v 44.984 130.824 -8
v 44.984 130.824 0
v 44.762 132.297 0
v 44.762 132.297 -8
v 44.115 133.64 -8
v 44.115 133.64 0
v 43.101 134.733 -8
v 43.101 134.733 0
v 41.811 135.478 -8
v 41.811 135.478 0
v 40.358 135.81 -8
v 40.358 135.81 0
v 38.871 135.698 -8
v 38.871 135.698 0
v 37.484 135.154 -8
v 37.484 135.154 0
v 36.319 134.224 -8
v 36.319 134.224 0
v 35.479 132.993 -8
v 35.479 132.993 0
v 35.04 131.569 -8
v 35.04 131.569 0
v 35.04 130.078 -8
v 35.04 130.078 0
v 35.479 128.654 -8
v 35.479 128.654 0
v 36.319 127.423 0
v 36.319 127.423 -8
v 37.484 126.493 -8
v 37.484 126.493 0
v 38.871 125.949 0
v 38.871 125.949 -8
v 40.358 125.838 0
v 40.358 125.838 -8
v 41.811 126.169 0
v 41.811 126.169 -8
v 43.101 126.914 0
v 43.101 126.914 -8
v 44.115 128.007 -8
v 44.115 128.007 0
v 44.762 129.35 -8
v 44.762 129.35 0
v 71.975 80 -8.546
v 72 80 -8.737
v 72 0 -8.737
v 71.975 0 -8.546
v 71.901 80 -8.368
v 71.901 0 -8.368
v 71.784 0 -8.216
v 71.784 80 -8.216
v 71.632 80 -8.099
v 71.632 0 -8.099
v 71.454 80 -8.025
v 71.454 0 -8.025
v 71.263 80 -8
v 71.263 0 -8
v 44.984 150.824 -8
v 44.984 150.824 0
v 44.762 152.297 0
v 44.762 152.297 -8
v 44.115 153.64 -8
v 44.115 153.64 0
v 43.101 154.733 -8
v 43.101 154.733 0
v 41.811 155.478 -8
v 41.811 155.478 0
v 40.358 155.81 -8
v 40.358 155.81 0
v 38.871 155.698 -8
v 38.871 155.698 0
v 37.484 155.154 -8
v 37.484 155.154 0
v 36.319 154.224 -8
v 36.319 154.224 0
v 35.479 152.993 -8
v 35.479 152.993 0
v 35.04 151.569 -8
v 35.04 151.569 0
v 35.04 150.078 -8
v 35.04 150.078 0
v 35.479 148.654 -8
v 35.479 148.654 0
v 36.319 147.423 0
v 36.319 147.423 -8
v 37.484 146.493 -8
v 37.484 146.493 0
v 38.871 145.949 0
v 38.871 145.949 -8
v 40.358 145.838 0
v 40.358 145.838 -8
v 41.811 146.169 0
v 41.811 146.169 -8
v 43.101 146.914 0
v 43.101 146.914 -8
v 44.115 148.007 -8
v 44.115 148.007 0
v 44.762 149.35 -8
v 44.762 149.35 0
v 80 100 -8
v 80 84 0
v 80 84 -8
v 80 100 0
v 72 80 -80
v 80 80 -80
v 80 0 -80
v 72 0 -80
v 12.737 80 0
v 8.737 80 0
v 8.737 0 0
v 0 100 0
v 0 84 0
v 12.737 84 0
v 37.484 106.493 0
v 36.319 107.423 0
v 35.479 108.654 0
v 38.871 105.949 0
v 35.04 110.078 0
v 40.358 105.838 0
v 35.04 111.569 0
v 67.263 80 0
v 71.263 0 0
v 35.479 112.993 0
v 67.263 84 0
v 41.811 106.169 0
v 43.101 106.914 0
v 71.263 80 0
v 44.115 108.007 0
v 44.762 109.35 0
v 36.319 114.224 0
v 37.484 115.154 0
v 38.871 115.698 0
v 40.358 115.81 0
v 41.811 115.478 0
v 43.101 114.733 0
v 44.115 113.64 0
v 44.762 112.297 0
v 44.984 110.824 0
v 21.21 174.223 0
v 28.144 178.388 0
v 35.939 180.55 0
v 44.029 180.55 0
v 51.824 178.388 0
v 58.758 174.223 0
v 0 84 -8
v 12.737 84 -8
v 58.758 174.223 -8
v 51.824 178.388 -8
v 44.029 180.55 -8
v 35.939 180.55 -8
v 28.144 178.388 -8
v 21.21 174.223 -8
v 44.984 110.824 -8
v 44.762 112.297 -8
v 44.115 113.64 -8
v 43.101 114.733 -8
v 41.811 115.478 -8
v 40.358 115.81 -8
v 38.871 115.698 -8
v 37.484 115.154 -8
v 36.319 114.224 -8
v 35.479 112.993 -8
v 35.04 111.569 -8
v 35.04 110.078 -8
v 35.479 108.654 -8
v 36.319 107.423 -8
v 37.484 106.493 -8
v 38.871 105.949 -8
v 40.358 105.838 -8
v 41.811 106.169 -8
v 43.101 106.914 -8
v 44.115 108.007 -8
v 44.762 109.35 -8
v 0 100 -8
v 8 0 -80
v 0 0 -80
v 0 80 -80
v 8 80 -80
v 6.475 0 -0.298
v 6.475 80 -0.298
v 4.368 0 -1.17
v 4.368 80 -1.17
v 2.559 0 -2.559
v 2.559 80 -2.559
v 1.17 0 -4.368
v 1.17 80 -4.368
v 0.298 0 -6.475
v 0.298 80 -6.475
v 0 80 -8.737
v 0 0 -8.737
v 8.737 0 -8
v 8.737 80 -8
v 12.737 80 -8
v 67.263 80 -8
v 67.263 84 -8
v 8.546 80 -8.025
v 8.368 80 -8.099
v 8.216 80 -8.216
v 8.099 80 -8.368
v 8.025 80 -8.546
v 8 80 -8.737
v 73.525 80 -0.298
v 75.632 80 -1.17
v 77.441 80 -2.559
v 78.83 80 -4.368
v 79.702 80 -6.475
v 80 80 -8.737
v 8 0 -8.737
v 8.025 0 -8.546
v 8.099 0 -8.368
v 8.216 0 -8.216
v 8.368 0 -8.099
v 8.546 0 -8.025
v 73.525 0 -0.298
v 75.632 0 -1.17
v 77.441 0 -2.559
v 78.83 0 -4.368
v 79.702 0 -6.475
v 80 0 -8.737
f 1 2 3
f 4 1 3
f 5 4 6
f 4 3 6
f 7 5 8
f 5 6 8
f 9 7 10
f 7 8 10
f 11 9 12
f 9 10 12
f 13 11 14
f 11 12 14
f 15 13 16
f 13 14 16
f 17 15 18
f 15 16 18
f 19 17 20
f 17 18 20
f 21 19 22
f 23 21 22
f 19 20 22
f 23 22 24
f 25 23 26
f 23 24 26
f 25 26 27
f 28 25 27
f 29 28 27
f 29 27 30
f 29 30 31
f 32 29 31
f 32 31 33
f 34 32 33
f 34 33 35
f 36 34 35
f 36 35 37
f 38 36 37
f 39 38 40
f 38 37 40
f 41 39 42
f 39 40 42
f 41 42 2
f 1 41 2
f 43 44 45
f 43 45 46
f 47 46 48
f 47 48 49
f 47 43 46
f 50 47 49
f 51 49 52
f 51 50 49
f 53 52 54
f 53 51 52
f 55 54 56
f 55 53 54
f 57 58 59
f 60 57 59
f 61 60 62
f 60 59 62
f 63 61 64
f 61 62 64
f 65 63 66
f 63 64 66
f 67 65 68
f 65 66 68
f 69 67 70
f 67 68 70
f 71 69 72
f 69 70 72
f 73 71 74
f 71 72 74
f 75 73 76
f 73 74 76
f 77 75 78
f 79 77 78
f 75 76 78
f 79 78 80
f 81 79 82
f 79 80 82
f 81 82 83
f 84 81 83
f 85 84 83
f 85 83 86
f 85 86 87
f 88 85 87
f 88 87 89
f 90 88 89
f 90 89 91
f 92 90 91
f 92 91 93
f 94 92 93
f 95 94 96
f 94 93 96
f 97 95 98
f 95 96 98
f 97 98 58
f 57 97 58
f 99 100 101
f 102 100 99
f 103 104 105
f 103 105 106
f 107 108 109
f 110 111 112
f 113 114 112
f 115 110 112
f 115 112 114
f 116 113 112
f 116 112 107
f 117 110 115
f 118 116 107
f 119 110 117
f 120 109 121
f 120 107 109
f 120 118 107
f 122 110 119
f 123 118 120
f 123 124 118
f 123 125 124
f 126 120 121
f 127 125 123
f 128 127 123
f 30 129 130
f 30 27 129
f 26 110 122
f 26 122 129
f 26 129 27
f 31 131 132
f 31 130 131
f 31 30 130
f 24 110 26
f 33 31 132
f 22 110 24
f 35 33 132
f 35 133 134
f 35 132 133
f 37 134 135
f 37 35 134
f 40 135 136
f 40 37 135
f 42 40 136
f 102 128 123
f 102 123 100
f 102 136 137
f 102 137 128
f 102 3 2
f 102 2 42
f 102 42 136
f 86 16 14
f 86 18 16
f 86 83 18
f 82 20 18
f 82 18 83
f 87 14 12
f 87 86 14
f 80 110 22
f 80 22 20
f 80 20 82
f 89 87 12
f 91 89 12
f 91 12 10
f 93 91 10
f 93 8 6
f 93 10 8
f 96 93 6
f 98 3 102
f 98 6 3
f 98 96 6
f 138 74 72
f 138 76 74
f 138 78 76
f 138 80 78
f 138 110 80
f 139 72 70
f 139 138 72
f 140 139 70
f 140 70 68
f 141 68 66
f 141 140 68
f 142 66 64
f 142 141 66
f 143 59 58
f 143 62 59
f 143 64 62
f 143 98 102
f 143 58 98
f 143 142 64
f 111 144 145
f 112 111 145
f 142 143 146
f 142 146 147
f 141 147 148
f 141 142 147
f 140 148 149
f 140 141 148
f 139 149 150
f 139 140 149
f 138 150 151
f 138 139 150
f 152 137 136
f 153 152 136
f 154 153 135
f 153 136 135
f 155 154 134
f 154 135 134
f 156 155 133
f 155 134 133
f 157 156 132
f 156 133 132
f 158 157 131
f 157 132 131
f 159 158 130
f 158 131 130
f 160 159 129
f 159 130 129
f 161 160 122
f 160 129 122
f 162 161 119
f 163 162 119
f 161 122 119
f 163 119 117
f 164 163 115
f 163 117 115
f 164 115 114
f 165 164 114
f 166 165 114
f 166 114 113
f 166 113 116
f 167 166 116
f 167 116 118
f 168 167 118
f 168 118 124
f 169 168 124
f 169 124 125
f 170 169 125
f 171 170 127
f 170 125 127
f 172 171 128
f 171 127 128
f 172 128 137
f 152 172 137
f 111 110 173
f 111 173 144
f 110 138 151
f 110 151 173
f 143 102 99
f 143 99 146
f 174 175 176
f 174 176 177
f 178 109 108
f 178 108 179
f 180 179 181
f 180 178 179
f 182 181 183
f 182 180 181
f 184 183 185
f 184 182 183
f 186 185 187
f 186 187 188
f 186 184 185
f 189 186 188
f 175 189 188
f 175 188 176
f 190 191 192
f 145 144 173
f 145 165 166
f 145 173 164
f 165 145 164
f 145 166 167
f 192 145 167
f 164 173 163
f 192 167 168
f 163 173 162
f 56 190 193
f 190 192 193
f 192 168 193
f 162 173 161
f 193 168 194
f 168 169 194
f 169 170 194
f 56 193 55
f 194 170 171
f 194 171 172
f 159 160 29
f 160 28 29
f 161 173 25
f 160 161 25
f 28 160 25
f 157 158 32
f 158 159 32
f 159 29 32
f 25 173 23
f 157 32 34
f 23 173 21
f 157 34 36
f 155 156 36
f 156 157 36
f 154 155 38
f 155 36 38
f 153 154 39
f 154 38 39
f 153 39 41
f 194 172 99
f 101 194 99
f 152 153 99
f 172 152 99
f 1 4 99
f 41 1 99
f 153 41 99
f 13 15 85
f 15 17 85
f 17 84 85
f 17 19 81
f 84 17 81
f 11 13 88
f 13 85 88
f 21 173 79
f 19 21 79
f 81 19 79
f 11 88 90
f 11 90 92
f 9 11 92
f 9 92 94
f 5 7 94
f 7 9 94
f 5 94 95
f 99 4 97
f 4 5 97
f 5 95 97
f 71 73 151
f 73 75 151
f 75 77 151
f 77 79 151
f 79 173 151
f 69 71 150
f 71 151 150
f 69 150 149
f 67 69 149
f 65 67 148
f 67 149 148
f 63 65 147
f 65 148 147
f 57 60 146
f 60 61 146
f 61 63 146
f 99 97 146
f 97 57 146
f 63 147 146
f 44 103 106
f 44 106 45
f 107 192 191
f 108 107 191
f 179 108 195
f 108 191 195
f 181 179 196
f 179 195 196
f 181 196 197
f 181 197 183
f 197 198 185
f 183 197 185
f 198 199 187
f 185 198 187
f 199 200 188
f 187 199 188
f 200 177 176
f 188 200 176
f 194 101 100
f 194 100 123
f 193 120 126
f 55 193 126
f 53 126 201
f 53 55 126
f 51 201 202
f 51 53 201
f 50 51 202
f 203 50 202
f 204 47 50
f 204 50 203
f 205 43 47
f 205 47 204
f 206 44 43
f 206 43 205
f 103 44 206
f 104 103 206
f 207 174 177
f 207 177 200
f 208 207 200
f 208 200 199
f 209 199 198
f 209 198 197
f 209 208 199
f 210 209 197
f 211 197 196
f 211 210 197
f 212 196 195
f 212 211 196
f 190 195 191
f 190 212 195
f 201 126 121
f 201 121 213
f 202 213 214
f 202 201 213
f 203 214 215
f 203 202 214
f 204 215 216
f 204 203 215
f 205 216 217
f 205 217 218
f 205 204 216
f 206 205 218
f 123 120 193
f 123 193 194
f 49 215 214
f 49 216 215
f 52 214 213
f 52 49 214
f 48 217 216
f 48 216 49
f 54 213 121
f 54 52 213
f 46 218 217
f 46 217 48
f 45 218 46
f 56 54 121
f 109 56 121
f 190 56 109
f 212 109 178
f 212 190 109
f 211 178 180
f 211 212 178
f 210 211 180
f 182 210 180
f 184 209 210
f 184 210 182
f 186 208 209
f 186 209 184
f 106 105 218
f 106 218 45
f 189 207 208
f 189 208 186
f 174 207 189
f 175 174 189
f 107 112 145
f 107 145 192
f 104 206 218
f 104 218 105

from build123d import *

# Parameters (mm, degrees)
SKETCH_1_R                         = 5
SM_BASE_FLANGE_2_DEPTH             = 8
SM_EDGE_FLANGE_10_STRIP_W          = 33.4732
SM_EDGE_FLANGE_10_STRIP_H          = 8
SM_EDGE_FLANGE_10_STRIP_CUT_DEPTH  = 80
SM_EDGE_FLANGE_10_RELIEF_W         = 37.4732
SM_EDGE_FLANGE_10_RELIEF_H         = 4
SM_EDGE_FLANGE_10_RELIEF_CUT_DEPTH = 8
SM_EDGE_FLANGE_10_DEPTH            = 80
SM_EDGE_FLANGE_12_STRIP_W          = 33.4732
SM_EDGE_FLANGE_12_STRIP_H          = 8
SM_EDGE_FLANGE_12_STRIP_CUT_DEPTH  = 80
SM_EDGE_FLANGE_12_RELIEF_W         = 37.4732
SM_EDGE_FLANGE_12_RELIEF_H         = 4
SM_EDGE_FLANGE_12_RELIEF_CUT_DEPTH = 8
SM_EDGE_FLANGE_12_DEPTH            = 80


# Sheet-metal steps are written as plain solids
with BuildPart() as part:
    # 草图1 → 基体-法兰2 (new body)
    with BuildSketch(Plane.XY):
        with BuildLine():
            Line((0, 0), (80, 0))
            Line((80, 0), (80, 100))
            Line((80, 100), (58.758007847, 174.223096705))
            ThreePointArc((58.758007847, 174.223096705), (39.983985428, 180.823607775), (21.209963009, 174.223096705))
            Line((21.209963009, 174.223096705), (0, 100))
            Line((0, 100), (0, 0))
        make_face()
        with Locations((39.983985428, 150.823607775)):
            Circle(SKETCH_1_R, mode=Mode.SUBTRACT)
        with Locations((39.983985428, 130.823607775)):
            Circle(SKETCH_1_R, mode=Mode.SUBTRACT)
        with Locations((39.983985428, 110.823607775)):
            Circle(SKETCH_1_R, mode=Mode.SUBTRACT)
    extrude(amount=-SM_BASE_FLANGE_2_DEPTH)

    # 边线-法兰10 strip (across the edge) → 边线-法兰10 strip cut (cut)
    with BuildSketch(Plane(origin=(80, 80, -8), x_dir=(-1, 0, 0), z_dir=(0, -1, 0))):
        with Locations((-8, -4)):
            Rectangle(SM_EDGE_FLANGE_10_STRIP_W, SM_EDGE_FLANGE_10_STRIP_H)
    extrude(amount=SM_EDGE_FLANGE_10_STRIP_CUT_DEPTH, mode=Mode.SUBTRACT)

    # 边线-法兰10 relief (on the sheet) → 边线-法兰10 relief cut (cut)
    with BuildSketch(Plane(origin=(71.2634, 80, -8), x_dir=(-1, 0, 0), z_dir=(0, 0, -1))):
        with Locations((-14.7366, 2)):
            Rectangle(SM_EDGE_FLANGE_10_RELIEF_W, SM_EDGE_FLANGE_10_RELIEF_H)
    extrude(amount=-SM_EDGE_FLANGE_10_RELIEF_CUT_DEPTH, mode=Mode.SUBTRACT)

    # 边线-法兰10 section (across the edge) → 边线-法兰10 (add)
    with BuildSketch(Plane(origin=(80, 80, -8), x_dir=(-1, 0, 0), z_dir=(0, -1, 0))):
        with BuildLine():
            Line((0, 0.7366), (0, 72))
            Line((0, 72), (8, 72))
            Line((8, 72), (8, 0.7366))
            ThreePointArc((8, 0.7366), (8.215745145, 0.215745145), (8.7366, 0))
            Line((8.7366, 0), (8.7366, -8))
            ThreePointArc((8.7366, -8), (2.558890895, -5.441109105), (0, 0.7366))
        make_face()
    extrude(amount=SM_EDGE_FLANGE_10_DEPTH)

    # 边线-法兰12 strip (across the edge) → 边线-法兰12 strip cut (cut)
    with BuildSketch(Plane(origin=(0, 0, -8), x_dir=(1, 0, 0), z_dir=(0, 1, 0))):
        with Locations((-8, -4)):
            Rectangle(SM_EDGE_FLANGE_12_STRIP_W, SM_EDGE_FLANGE_12_STRIP_H)
    extrude(amount=SM_EDGE_FLANGE_12_STRIP_CUT_DEPTH, mode=Mode.SUBTRACT)

    # 边线-法兰12 relief (on the sheet) → 边线-法兰12 relief cut (cut)
    with BuildSketch(Plane(origin=(8.7366, 0, -8), x_dir=(1, 0, 0), z_dir=(0, 0, -1))):
        with Locations((-14.7366, -82)):
            Rectangle(SM_EDGE_FLANGE_12_RELIEF_W, SM_EDGE_FLANGE_12_RELIEF_H)
    extrude(amount=-SM_EDGE_FLANGE_12_RELIEF_CUT_DEPTH, mode=Mode.SUBTRACT)

    # 边线-法兰12 section (across the edge) → 边线-法兰12 (add)
    with BuildSketch(Plane(origin=(0, 0, -8), x_dir=(1, 0, 0), z_dir=(0, 1, 0))):
        with BuildLine():
            Line((0, 0.7366), (0, 72))
            Line((0, 72), (8, 72))
            Line((8, 72), (8, 0.7366))
            ThreePointArc((8, 0.7366), (8.215745145, 0.215745145), (8.7366, 0))
            Line((8.7366, 0), (8.7366, -8))
            ThreePointArc((8.7366, -8), (2.558890895, -5.441109105), (0, 0.7366))
        make_face()
    extrude(amount=SM_EDGE_FLANGE_12_DEPTH)


solid = part.part
